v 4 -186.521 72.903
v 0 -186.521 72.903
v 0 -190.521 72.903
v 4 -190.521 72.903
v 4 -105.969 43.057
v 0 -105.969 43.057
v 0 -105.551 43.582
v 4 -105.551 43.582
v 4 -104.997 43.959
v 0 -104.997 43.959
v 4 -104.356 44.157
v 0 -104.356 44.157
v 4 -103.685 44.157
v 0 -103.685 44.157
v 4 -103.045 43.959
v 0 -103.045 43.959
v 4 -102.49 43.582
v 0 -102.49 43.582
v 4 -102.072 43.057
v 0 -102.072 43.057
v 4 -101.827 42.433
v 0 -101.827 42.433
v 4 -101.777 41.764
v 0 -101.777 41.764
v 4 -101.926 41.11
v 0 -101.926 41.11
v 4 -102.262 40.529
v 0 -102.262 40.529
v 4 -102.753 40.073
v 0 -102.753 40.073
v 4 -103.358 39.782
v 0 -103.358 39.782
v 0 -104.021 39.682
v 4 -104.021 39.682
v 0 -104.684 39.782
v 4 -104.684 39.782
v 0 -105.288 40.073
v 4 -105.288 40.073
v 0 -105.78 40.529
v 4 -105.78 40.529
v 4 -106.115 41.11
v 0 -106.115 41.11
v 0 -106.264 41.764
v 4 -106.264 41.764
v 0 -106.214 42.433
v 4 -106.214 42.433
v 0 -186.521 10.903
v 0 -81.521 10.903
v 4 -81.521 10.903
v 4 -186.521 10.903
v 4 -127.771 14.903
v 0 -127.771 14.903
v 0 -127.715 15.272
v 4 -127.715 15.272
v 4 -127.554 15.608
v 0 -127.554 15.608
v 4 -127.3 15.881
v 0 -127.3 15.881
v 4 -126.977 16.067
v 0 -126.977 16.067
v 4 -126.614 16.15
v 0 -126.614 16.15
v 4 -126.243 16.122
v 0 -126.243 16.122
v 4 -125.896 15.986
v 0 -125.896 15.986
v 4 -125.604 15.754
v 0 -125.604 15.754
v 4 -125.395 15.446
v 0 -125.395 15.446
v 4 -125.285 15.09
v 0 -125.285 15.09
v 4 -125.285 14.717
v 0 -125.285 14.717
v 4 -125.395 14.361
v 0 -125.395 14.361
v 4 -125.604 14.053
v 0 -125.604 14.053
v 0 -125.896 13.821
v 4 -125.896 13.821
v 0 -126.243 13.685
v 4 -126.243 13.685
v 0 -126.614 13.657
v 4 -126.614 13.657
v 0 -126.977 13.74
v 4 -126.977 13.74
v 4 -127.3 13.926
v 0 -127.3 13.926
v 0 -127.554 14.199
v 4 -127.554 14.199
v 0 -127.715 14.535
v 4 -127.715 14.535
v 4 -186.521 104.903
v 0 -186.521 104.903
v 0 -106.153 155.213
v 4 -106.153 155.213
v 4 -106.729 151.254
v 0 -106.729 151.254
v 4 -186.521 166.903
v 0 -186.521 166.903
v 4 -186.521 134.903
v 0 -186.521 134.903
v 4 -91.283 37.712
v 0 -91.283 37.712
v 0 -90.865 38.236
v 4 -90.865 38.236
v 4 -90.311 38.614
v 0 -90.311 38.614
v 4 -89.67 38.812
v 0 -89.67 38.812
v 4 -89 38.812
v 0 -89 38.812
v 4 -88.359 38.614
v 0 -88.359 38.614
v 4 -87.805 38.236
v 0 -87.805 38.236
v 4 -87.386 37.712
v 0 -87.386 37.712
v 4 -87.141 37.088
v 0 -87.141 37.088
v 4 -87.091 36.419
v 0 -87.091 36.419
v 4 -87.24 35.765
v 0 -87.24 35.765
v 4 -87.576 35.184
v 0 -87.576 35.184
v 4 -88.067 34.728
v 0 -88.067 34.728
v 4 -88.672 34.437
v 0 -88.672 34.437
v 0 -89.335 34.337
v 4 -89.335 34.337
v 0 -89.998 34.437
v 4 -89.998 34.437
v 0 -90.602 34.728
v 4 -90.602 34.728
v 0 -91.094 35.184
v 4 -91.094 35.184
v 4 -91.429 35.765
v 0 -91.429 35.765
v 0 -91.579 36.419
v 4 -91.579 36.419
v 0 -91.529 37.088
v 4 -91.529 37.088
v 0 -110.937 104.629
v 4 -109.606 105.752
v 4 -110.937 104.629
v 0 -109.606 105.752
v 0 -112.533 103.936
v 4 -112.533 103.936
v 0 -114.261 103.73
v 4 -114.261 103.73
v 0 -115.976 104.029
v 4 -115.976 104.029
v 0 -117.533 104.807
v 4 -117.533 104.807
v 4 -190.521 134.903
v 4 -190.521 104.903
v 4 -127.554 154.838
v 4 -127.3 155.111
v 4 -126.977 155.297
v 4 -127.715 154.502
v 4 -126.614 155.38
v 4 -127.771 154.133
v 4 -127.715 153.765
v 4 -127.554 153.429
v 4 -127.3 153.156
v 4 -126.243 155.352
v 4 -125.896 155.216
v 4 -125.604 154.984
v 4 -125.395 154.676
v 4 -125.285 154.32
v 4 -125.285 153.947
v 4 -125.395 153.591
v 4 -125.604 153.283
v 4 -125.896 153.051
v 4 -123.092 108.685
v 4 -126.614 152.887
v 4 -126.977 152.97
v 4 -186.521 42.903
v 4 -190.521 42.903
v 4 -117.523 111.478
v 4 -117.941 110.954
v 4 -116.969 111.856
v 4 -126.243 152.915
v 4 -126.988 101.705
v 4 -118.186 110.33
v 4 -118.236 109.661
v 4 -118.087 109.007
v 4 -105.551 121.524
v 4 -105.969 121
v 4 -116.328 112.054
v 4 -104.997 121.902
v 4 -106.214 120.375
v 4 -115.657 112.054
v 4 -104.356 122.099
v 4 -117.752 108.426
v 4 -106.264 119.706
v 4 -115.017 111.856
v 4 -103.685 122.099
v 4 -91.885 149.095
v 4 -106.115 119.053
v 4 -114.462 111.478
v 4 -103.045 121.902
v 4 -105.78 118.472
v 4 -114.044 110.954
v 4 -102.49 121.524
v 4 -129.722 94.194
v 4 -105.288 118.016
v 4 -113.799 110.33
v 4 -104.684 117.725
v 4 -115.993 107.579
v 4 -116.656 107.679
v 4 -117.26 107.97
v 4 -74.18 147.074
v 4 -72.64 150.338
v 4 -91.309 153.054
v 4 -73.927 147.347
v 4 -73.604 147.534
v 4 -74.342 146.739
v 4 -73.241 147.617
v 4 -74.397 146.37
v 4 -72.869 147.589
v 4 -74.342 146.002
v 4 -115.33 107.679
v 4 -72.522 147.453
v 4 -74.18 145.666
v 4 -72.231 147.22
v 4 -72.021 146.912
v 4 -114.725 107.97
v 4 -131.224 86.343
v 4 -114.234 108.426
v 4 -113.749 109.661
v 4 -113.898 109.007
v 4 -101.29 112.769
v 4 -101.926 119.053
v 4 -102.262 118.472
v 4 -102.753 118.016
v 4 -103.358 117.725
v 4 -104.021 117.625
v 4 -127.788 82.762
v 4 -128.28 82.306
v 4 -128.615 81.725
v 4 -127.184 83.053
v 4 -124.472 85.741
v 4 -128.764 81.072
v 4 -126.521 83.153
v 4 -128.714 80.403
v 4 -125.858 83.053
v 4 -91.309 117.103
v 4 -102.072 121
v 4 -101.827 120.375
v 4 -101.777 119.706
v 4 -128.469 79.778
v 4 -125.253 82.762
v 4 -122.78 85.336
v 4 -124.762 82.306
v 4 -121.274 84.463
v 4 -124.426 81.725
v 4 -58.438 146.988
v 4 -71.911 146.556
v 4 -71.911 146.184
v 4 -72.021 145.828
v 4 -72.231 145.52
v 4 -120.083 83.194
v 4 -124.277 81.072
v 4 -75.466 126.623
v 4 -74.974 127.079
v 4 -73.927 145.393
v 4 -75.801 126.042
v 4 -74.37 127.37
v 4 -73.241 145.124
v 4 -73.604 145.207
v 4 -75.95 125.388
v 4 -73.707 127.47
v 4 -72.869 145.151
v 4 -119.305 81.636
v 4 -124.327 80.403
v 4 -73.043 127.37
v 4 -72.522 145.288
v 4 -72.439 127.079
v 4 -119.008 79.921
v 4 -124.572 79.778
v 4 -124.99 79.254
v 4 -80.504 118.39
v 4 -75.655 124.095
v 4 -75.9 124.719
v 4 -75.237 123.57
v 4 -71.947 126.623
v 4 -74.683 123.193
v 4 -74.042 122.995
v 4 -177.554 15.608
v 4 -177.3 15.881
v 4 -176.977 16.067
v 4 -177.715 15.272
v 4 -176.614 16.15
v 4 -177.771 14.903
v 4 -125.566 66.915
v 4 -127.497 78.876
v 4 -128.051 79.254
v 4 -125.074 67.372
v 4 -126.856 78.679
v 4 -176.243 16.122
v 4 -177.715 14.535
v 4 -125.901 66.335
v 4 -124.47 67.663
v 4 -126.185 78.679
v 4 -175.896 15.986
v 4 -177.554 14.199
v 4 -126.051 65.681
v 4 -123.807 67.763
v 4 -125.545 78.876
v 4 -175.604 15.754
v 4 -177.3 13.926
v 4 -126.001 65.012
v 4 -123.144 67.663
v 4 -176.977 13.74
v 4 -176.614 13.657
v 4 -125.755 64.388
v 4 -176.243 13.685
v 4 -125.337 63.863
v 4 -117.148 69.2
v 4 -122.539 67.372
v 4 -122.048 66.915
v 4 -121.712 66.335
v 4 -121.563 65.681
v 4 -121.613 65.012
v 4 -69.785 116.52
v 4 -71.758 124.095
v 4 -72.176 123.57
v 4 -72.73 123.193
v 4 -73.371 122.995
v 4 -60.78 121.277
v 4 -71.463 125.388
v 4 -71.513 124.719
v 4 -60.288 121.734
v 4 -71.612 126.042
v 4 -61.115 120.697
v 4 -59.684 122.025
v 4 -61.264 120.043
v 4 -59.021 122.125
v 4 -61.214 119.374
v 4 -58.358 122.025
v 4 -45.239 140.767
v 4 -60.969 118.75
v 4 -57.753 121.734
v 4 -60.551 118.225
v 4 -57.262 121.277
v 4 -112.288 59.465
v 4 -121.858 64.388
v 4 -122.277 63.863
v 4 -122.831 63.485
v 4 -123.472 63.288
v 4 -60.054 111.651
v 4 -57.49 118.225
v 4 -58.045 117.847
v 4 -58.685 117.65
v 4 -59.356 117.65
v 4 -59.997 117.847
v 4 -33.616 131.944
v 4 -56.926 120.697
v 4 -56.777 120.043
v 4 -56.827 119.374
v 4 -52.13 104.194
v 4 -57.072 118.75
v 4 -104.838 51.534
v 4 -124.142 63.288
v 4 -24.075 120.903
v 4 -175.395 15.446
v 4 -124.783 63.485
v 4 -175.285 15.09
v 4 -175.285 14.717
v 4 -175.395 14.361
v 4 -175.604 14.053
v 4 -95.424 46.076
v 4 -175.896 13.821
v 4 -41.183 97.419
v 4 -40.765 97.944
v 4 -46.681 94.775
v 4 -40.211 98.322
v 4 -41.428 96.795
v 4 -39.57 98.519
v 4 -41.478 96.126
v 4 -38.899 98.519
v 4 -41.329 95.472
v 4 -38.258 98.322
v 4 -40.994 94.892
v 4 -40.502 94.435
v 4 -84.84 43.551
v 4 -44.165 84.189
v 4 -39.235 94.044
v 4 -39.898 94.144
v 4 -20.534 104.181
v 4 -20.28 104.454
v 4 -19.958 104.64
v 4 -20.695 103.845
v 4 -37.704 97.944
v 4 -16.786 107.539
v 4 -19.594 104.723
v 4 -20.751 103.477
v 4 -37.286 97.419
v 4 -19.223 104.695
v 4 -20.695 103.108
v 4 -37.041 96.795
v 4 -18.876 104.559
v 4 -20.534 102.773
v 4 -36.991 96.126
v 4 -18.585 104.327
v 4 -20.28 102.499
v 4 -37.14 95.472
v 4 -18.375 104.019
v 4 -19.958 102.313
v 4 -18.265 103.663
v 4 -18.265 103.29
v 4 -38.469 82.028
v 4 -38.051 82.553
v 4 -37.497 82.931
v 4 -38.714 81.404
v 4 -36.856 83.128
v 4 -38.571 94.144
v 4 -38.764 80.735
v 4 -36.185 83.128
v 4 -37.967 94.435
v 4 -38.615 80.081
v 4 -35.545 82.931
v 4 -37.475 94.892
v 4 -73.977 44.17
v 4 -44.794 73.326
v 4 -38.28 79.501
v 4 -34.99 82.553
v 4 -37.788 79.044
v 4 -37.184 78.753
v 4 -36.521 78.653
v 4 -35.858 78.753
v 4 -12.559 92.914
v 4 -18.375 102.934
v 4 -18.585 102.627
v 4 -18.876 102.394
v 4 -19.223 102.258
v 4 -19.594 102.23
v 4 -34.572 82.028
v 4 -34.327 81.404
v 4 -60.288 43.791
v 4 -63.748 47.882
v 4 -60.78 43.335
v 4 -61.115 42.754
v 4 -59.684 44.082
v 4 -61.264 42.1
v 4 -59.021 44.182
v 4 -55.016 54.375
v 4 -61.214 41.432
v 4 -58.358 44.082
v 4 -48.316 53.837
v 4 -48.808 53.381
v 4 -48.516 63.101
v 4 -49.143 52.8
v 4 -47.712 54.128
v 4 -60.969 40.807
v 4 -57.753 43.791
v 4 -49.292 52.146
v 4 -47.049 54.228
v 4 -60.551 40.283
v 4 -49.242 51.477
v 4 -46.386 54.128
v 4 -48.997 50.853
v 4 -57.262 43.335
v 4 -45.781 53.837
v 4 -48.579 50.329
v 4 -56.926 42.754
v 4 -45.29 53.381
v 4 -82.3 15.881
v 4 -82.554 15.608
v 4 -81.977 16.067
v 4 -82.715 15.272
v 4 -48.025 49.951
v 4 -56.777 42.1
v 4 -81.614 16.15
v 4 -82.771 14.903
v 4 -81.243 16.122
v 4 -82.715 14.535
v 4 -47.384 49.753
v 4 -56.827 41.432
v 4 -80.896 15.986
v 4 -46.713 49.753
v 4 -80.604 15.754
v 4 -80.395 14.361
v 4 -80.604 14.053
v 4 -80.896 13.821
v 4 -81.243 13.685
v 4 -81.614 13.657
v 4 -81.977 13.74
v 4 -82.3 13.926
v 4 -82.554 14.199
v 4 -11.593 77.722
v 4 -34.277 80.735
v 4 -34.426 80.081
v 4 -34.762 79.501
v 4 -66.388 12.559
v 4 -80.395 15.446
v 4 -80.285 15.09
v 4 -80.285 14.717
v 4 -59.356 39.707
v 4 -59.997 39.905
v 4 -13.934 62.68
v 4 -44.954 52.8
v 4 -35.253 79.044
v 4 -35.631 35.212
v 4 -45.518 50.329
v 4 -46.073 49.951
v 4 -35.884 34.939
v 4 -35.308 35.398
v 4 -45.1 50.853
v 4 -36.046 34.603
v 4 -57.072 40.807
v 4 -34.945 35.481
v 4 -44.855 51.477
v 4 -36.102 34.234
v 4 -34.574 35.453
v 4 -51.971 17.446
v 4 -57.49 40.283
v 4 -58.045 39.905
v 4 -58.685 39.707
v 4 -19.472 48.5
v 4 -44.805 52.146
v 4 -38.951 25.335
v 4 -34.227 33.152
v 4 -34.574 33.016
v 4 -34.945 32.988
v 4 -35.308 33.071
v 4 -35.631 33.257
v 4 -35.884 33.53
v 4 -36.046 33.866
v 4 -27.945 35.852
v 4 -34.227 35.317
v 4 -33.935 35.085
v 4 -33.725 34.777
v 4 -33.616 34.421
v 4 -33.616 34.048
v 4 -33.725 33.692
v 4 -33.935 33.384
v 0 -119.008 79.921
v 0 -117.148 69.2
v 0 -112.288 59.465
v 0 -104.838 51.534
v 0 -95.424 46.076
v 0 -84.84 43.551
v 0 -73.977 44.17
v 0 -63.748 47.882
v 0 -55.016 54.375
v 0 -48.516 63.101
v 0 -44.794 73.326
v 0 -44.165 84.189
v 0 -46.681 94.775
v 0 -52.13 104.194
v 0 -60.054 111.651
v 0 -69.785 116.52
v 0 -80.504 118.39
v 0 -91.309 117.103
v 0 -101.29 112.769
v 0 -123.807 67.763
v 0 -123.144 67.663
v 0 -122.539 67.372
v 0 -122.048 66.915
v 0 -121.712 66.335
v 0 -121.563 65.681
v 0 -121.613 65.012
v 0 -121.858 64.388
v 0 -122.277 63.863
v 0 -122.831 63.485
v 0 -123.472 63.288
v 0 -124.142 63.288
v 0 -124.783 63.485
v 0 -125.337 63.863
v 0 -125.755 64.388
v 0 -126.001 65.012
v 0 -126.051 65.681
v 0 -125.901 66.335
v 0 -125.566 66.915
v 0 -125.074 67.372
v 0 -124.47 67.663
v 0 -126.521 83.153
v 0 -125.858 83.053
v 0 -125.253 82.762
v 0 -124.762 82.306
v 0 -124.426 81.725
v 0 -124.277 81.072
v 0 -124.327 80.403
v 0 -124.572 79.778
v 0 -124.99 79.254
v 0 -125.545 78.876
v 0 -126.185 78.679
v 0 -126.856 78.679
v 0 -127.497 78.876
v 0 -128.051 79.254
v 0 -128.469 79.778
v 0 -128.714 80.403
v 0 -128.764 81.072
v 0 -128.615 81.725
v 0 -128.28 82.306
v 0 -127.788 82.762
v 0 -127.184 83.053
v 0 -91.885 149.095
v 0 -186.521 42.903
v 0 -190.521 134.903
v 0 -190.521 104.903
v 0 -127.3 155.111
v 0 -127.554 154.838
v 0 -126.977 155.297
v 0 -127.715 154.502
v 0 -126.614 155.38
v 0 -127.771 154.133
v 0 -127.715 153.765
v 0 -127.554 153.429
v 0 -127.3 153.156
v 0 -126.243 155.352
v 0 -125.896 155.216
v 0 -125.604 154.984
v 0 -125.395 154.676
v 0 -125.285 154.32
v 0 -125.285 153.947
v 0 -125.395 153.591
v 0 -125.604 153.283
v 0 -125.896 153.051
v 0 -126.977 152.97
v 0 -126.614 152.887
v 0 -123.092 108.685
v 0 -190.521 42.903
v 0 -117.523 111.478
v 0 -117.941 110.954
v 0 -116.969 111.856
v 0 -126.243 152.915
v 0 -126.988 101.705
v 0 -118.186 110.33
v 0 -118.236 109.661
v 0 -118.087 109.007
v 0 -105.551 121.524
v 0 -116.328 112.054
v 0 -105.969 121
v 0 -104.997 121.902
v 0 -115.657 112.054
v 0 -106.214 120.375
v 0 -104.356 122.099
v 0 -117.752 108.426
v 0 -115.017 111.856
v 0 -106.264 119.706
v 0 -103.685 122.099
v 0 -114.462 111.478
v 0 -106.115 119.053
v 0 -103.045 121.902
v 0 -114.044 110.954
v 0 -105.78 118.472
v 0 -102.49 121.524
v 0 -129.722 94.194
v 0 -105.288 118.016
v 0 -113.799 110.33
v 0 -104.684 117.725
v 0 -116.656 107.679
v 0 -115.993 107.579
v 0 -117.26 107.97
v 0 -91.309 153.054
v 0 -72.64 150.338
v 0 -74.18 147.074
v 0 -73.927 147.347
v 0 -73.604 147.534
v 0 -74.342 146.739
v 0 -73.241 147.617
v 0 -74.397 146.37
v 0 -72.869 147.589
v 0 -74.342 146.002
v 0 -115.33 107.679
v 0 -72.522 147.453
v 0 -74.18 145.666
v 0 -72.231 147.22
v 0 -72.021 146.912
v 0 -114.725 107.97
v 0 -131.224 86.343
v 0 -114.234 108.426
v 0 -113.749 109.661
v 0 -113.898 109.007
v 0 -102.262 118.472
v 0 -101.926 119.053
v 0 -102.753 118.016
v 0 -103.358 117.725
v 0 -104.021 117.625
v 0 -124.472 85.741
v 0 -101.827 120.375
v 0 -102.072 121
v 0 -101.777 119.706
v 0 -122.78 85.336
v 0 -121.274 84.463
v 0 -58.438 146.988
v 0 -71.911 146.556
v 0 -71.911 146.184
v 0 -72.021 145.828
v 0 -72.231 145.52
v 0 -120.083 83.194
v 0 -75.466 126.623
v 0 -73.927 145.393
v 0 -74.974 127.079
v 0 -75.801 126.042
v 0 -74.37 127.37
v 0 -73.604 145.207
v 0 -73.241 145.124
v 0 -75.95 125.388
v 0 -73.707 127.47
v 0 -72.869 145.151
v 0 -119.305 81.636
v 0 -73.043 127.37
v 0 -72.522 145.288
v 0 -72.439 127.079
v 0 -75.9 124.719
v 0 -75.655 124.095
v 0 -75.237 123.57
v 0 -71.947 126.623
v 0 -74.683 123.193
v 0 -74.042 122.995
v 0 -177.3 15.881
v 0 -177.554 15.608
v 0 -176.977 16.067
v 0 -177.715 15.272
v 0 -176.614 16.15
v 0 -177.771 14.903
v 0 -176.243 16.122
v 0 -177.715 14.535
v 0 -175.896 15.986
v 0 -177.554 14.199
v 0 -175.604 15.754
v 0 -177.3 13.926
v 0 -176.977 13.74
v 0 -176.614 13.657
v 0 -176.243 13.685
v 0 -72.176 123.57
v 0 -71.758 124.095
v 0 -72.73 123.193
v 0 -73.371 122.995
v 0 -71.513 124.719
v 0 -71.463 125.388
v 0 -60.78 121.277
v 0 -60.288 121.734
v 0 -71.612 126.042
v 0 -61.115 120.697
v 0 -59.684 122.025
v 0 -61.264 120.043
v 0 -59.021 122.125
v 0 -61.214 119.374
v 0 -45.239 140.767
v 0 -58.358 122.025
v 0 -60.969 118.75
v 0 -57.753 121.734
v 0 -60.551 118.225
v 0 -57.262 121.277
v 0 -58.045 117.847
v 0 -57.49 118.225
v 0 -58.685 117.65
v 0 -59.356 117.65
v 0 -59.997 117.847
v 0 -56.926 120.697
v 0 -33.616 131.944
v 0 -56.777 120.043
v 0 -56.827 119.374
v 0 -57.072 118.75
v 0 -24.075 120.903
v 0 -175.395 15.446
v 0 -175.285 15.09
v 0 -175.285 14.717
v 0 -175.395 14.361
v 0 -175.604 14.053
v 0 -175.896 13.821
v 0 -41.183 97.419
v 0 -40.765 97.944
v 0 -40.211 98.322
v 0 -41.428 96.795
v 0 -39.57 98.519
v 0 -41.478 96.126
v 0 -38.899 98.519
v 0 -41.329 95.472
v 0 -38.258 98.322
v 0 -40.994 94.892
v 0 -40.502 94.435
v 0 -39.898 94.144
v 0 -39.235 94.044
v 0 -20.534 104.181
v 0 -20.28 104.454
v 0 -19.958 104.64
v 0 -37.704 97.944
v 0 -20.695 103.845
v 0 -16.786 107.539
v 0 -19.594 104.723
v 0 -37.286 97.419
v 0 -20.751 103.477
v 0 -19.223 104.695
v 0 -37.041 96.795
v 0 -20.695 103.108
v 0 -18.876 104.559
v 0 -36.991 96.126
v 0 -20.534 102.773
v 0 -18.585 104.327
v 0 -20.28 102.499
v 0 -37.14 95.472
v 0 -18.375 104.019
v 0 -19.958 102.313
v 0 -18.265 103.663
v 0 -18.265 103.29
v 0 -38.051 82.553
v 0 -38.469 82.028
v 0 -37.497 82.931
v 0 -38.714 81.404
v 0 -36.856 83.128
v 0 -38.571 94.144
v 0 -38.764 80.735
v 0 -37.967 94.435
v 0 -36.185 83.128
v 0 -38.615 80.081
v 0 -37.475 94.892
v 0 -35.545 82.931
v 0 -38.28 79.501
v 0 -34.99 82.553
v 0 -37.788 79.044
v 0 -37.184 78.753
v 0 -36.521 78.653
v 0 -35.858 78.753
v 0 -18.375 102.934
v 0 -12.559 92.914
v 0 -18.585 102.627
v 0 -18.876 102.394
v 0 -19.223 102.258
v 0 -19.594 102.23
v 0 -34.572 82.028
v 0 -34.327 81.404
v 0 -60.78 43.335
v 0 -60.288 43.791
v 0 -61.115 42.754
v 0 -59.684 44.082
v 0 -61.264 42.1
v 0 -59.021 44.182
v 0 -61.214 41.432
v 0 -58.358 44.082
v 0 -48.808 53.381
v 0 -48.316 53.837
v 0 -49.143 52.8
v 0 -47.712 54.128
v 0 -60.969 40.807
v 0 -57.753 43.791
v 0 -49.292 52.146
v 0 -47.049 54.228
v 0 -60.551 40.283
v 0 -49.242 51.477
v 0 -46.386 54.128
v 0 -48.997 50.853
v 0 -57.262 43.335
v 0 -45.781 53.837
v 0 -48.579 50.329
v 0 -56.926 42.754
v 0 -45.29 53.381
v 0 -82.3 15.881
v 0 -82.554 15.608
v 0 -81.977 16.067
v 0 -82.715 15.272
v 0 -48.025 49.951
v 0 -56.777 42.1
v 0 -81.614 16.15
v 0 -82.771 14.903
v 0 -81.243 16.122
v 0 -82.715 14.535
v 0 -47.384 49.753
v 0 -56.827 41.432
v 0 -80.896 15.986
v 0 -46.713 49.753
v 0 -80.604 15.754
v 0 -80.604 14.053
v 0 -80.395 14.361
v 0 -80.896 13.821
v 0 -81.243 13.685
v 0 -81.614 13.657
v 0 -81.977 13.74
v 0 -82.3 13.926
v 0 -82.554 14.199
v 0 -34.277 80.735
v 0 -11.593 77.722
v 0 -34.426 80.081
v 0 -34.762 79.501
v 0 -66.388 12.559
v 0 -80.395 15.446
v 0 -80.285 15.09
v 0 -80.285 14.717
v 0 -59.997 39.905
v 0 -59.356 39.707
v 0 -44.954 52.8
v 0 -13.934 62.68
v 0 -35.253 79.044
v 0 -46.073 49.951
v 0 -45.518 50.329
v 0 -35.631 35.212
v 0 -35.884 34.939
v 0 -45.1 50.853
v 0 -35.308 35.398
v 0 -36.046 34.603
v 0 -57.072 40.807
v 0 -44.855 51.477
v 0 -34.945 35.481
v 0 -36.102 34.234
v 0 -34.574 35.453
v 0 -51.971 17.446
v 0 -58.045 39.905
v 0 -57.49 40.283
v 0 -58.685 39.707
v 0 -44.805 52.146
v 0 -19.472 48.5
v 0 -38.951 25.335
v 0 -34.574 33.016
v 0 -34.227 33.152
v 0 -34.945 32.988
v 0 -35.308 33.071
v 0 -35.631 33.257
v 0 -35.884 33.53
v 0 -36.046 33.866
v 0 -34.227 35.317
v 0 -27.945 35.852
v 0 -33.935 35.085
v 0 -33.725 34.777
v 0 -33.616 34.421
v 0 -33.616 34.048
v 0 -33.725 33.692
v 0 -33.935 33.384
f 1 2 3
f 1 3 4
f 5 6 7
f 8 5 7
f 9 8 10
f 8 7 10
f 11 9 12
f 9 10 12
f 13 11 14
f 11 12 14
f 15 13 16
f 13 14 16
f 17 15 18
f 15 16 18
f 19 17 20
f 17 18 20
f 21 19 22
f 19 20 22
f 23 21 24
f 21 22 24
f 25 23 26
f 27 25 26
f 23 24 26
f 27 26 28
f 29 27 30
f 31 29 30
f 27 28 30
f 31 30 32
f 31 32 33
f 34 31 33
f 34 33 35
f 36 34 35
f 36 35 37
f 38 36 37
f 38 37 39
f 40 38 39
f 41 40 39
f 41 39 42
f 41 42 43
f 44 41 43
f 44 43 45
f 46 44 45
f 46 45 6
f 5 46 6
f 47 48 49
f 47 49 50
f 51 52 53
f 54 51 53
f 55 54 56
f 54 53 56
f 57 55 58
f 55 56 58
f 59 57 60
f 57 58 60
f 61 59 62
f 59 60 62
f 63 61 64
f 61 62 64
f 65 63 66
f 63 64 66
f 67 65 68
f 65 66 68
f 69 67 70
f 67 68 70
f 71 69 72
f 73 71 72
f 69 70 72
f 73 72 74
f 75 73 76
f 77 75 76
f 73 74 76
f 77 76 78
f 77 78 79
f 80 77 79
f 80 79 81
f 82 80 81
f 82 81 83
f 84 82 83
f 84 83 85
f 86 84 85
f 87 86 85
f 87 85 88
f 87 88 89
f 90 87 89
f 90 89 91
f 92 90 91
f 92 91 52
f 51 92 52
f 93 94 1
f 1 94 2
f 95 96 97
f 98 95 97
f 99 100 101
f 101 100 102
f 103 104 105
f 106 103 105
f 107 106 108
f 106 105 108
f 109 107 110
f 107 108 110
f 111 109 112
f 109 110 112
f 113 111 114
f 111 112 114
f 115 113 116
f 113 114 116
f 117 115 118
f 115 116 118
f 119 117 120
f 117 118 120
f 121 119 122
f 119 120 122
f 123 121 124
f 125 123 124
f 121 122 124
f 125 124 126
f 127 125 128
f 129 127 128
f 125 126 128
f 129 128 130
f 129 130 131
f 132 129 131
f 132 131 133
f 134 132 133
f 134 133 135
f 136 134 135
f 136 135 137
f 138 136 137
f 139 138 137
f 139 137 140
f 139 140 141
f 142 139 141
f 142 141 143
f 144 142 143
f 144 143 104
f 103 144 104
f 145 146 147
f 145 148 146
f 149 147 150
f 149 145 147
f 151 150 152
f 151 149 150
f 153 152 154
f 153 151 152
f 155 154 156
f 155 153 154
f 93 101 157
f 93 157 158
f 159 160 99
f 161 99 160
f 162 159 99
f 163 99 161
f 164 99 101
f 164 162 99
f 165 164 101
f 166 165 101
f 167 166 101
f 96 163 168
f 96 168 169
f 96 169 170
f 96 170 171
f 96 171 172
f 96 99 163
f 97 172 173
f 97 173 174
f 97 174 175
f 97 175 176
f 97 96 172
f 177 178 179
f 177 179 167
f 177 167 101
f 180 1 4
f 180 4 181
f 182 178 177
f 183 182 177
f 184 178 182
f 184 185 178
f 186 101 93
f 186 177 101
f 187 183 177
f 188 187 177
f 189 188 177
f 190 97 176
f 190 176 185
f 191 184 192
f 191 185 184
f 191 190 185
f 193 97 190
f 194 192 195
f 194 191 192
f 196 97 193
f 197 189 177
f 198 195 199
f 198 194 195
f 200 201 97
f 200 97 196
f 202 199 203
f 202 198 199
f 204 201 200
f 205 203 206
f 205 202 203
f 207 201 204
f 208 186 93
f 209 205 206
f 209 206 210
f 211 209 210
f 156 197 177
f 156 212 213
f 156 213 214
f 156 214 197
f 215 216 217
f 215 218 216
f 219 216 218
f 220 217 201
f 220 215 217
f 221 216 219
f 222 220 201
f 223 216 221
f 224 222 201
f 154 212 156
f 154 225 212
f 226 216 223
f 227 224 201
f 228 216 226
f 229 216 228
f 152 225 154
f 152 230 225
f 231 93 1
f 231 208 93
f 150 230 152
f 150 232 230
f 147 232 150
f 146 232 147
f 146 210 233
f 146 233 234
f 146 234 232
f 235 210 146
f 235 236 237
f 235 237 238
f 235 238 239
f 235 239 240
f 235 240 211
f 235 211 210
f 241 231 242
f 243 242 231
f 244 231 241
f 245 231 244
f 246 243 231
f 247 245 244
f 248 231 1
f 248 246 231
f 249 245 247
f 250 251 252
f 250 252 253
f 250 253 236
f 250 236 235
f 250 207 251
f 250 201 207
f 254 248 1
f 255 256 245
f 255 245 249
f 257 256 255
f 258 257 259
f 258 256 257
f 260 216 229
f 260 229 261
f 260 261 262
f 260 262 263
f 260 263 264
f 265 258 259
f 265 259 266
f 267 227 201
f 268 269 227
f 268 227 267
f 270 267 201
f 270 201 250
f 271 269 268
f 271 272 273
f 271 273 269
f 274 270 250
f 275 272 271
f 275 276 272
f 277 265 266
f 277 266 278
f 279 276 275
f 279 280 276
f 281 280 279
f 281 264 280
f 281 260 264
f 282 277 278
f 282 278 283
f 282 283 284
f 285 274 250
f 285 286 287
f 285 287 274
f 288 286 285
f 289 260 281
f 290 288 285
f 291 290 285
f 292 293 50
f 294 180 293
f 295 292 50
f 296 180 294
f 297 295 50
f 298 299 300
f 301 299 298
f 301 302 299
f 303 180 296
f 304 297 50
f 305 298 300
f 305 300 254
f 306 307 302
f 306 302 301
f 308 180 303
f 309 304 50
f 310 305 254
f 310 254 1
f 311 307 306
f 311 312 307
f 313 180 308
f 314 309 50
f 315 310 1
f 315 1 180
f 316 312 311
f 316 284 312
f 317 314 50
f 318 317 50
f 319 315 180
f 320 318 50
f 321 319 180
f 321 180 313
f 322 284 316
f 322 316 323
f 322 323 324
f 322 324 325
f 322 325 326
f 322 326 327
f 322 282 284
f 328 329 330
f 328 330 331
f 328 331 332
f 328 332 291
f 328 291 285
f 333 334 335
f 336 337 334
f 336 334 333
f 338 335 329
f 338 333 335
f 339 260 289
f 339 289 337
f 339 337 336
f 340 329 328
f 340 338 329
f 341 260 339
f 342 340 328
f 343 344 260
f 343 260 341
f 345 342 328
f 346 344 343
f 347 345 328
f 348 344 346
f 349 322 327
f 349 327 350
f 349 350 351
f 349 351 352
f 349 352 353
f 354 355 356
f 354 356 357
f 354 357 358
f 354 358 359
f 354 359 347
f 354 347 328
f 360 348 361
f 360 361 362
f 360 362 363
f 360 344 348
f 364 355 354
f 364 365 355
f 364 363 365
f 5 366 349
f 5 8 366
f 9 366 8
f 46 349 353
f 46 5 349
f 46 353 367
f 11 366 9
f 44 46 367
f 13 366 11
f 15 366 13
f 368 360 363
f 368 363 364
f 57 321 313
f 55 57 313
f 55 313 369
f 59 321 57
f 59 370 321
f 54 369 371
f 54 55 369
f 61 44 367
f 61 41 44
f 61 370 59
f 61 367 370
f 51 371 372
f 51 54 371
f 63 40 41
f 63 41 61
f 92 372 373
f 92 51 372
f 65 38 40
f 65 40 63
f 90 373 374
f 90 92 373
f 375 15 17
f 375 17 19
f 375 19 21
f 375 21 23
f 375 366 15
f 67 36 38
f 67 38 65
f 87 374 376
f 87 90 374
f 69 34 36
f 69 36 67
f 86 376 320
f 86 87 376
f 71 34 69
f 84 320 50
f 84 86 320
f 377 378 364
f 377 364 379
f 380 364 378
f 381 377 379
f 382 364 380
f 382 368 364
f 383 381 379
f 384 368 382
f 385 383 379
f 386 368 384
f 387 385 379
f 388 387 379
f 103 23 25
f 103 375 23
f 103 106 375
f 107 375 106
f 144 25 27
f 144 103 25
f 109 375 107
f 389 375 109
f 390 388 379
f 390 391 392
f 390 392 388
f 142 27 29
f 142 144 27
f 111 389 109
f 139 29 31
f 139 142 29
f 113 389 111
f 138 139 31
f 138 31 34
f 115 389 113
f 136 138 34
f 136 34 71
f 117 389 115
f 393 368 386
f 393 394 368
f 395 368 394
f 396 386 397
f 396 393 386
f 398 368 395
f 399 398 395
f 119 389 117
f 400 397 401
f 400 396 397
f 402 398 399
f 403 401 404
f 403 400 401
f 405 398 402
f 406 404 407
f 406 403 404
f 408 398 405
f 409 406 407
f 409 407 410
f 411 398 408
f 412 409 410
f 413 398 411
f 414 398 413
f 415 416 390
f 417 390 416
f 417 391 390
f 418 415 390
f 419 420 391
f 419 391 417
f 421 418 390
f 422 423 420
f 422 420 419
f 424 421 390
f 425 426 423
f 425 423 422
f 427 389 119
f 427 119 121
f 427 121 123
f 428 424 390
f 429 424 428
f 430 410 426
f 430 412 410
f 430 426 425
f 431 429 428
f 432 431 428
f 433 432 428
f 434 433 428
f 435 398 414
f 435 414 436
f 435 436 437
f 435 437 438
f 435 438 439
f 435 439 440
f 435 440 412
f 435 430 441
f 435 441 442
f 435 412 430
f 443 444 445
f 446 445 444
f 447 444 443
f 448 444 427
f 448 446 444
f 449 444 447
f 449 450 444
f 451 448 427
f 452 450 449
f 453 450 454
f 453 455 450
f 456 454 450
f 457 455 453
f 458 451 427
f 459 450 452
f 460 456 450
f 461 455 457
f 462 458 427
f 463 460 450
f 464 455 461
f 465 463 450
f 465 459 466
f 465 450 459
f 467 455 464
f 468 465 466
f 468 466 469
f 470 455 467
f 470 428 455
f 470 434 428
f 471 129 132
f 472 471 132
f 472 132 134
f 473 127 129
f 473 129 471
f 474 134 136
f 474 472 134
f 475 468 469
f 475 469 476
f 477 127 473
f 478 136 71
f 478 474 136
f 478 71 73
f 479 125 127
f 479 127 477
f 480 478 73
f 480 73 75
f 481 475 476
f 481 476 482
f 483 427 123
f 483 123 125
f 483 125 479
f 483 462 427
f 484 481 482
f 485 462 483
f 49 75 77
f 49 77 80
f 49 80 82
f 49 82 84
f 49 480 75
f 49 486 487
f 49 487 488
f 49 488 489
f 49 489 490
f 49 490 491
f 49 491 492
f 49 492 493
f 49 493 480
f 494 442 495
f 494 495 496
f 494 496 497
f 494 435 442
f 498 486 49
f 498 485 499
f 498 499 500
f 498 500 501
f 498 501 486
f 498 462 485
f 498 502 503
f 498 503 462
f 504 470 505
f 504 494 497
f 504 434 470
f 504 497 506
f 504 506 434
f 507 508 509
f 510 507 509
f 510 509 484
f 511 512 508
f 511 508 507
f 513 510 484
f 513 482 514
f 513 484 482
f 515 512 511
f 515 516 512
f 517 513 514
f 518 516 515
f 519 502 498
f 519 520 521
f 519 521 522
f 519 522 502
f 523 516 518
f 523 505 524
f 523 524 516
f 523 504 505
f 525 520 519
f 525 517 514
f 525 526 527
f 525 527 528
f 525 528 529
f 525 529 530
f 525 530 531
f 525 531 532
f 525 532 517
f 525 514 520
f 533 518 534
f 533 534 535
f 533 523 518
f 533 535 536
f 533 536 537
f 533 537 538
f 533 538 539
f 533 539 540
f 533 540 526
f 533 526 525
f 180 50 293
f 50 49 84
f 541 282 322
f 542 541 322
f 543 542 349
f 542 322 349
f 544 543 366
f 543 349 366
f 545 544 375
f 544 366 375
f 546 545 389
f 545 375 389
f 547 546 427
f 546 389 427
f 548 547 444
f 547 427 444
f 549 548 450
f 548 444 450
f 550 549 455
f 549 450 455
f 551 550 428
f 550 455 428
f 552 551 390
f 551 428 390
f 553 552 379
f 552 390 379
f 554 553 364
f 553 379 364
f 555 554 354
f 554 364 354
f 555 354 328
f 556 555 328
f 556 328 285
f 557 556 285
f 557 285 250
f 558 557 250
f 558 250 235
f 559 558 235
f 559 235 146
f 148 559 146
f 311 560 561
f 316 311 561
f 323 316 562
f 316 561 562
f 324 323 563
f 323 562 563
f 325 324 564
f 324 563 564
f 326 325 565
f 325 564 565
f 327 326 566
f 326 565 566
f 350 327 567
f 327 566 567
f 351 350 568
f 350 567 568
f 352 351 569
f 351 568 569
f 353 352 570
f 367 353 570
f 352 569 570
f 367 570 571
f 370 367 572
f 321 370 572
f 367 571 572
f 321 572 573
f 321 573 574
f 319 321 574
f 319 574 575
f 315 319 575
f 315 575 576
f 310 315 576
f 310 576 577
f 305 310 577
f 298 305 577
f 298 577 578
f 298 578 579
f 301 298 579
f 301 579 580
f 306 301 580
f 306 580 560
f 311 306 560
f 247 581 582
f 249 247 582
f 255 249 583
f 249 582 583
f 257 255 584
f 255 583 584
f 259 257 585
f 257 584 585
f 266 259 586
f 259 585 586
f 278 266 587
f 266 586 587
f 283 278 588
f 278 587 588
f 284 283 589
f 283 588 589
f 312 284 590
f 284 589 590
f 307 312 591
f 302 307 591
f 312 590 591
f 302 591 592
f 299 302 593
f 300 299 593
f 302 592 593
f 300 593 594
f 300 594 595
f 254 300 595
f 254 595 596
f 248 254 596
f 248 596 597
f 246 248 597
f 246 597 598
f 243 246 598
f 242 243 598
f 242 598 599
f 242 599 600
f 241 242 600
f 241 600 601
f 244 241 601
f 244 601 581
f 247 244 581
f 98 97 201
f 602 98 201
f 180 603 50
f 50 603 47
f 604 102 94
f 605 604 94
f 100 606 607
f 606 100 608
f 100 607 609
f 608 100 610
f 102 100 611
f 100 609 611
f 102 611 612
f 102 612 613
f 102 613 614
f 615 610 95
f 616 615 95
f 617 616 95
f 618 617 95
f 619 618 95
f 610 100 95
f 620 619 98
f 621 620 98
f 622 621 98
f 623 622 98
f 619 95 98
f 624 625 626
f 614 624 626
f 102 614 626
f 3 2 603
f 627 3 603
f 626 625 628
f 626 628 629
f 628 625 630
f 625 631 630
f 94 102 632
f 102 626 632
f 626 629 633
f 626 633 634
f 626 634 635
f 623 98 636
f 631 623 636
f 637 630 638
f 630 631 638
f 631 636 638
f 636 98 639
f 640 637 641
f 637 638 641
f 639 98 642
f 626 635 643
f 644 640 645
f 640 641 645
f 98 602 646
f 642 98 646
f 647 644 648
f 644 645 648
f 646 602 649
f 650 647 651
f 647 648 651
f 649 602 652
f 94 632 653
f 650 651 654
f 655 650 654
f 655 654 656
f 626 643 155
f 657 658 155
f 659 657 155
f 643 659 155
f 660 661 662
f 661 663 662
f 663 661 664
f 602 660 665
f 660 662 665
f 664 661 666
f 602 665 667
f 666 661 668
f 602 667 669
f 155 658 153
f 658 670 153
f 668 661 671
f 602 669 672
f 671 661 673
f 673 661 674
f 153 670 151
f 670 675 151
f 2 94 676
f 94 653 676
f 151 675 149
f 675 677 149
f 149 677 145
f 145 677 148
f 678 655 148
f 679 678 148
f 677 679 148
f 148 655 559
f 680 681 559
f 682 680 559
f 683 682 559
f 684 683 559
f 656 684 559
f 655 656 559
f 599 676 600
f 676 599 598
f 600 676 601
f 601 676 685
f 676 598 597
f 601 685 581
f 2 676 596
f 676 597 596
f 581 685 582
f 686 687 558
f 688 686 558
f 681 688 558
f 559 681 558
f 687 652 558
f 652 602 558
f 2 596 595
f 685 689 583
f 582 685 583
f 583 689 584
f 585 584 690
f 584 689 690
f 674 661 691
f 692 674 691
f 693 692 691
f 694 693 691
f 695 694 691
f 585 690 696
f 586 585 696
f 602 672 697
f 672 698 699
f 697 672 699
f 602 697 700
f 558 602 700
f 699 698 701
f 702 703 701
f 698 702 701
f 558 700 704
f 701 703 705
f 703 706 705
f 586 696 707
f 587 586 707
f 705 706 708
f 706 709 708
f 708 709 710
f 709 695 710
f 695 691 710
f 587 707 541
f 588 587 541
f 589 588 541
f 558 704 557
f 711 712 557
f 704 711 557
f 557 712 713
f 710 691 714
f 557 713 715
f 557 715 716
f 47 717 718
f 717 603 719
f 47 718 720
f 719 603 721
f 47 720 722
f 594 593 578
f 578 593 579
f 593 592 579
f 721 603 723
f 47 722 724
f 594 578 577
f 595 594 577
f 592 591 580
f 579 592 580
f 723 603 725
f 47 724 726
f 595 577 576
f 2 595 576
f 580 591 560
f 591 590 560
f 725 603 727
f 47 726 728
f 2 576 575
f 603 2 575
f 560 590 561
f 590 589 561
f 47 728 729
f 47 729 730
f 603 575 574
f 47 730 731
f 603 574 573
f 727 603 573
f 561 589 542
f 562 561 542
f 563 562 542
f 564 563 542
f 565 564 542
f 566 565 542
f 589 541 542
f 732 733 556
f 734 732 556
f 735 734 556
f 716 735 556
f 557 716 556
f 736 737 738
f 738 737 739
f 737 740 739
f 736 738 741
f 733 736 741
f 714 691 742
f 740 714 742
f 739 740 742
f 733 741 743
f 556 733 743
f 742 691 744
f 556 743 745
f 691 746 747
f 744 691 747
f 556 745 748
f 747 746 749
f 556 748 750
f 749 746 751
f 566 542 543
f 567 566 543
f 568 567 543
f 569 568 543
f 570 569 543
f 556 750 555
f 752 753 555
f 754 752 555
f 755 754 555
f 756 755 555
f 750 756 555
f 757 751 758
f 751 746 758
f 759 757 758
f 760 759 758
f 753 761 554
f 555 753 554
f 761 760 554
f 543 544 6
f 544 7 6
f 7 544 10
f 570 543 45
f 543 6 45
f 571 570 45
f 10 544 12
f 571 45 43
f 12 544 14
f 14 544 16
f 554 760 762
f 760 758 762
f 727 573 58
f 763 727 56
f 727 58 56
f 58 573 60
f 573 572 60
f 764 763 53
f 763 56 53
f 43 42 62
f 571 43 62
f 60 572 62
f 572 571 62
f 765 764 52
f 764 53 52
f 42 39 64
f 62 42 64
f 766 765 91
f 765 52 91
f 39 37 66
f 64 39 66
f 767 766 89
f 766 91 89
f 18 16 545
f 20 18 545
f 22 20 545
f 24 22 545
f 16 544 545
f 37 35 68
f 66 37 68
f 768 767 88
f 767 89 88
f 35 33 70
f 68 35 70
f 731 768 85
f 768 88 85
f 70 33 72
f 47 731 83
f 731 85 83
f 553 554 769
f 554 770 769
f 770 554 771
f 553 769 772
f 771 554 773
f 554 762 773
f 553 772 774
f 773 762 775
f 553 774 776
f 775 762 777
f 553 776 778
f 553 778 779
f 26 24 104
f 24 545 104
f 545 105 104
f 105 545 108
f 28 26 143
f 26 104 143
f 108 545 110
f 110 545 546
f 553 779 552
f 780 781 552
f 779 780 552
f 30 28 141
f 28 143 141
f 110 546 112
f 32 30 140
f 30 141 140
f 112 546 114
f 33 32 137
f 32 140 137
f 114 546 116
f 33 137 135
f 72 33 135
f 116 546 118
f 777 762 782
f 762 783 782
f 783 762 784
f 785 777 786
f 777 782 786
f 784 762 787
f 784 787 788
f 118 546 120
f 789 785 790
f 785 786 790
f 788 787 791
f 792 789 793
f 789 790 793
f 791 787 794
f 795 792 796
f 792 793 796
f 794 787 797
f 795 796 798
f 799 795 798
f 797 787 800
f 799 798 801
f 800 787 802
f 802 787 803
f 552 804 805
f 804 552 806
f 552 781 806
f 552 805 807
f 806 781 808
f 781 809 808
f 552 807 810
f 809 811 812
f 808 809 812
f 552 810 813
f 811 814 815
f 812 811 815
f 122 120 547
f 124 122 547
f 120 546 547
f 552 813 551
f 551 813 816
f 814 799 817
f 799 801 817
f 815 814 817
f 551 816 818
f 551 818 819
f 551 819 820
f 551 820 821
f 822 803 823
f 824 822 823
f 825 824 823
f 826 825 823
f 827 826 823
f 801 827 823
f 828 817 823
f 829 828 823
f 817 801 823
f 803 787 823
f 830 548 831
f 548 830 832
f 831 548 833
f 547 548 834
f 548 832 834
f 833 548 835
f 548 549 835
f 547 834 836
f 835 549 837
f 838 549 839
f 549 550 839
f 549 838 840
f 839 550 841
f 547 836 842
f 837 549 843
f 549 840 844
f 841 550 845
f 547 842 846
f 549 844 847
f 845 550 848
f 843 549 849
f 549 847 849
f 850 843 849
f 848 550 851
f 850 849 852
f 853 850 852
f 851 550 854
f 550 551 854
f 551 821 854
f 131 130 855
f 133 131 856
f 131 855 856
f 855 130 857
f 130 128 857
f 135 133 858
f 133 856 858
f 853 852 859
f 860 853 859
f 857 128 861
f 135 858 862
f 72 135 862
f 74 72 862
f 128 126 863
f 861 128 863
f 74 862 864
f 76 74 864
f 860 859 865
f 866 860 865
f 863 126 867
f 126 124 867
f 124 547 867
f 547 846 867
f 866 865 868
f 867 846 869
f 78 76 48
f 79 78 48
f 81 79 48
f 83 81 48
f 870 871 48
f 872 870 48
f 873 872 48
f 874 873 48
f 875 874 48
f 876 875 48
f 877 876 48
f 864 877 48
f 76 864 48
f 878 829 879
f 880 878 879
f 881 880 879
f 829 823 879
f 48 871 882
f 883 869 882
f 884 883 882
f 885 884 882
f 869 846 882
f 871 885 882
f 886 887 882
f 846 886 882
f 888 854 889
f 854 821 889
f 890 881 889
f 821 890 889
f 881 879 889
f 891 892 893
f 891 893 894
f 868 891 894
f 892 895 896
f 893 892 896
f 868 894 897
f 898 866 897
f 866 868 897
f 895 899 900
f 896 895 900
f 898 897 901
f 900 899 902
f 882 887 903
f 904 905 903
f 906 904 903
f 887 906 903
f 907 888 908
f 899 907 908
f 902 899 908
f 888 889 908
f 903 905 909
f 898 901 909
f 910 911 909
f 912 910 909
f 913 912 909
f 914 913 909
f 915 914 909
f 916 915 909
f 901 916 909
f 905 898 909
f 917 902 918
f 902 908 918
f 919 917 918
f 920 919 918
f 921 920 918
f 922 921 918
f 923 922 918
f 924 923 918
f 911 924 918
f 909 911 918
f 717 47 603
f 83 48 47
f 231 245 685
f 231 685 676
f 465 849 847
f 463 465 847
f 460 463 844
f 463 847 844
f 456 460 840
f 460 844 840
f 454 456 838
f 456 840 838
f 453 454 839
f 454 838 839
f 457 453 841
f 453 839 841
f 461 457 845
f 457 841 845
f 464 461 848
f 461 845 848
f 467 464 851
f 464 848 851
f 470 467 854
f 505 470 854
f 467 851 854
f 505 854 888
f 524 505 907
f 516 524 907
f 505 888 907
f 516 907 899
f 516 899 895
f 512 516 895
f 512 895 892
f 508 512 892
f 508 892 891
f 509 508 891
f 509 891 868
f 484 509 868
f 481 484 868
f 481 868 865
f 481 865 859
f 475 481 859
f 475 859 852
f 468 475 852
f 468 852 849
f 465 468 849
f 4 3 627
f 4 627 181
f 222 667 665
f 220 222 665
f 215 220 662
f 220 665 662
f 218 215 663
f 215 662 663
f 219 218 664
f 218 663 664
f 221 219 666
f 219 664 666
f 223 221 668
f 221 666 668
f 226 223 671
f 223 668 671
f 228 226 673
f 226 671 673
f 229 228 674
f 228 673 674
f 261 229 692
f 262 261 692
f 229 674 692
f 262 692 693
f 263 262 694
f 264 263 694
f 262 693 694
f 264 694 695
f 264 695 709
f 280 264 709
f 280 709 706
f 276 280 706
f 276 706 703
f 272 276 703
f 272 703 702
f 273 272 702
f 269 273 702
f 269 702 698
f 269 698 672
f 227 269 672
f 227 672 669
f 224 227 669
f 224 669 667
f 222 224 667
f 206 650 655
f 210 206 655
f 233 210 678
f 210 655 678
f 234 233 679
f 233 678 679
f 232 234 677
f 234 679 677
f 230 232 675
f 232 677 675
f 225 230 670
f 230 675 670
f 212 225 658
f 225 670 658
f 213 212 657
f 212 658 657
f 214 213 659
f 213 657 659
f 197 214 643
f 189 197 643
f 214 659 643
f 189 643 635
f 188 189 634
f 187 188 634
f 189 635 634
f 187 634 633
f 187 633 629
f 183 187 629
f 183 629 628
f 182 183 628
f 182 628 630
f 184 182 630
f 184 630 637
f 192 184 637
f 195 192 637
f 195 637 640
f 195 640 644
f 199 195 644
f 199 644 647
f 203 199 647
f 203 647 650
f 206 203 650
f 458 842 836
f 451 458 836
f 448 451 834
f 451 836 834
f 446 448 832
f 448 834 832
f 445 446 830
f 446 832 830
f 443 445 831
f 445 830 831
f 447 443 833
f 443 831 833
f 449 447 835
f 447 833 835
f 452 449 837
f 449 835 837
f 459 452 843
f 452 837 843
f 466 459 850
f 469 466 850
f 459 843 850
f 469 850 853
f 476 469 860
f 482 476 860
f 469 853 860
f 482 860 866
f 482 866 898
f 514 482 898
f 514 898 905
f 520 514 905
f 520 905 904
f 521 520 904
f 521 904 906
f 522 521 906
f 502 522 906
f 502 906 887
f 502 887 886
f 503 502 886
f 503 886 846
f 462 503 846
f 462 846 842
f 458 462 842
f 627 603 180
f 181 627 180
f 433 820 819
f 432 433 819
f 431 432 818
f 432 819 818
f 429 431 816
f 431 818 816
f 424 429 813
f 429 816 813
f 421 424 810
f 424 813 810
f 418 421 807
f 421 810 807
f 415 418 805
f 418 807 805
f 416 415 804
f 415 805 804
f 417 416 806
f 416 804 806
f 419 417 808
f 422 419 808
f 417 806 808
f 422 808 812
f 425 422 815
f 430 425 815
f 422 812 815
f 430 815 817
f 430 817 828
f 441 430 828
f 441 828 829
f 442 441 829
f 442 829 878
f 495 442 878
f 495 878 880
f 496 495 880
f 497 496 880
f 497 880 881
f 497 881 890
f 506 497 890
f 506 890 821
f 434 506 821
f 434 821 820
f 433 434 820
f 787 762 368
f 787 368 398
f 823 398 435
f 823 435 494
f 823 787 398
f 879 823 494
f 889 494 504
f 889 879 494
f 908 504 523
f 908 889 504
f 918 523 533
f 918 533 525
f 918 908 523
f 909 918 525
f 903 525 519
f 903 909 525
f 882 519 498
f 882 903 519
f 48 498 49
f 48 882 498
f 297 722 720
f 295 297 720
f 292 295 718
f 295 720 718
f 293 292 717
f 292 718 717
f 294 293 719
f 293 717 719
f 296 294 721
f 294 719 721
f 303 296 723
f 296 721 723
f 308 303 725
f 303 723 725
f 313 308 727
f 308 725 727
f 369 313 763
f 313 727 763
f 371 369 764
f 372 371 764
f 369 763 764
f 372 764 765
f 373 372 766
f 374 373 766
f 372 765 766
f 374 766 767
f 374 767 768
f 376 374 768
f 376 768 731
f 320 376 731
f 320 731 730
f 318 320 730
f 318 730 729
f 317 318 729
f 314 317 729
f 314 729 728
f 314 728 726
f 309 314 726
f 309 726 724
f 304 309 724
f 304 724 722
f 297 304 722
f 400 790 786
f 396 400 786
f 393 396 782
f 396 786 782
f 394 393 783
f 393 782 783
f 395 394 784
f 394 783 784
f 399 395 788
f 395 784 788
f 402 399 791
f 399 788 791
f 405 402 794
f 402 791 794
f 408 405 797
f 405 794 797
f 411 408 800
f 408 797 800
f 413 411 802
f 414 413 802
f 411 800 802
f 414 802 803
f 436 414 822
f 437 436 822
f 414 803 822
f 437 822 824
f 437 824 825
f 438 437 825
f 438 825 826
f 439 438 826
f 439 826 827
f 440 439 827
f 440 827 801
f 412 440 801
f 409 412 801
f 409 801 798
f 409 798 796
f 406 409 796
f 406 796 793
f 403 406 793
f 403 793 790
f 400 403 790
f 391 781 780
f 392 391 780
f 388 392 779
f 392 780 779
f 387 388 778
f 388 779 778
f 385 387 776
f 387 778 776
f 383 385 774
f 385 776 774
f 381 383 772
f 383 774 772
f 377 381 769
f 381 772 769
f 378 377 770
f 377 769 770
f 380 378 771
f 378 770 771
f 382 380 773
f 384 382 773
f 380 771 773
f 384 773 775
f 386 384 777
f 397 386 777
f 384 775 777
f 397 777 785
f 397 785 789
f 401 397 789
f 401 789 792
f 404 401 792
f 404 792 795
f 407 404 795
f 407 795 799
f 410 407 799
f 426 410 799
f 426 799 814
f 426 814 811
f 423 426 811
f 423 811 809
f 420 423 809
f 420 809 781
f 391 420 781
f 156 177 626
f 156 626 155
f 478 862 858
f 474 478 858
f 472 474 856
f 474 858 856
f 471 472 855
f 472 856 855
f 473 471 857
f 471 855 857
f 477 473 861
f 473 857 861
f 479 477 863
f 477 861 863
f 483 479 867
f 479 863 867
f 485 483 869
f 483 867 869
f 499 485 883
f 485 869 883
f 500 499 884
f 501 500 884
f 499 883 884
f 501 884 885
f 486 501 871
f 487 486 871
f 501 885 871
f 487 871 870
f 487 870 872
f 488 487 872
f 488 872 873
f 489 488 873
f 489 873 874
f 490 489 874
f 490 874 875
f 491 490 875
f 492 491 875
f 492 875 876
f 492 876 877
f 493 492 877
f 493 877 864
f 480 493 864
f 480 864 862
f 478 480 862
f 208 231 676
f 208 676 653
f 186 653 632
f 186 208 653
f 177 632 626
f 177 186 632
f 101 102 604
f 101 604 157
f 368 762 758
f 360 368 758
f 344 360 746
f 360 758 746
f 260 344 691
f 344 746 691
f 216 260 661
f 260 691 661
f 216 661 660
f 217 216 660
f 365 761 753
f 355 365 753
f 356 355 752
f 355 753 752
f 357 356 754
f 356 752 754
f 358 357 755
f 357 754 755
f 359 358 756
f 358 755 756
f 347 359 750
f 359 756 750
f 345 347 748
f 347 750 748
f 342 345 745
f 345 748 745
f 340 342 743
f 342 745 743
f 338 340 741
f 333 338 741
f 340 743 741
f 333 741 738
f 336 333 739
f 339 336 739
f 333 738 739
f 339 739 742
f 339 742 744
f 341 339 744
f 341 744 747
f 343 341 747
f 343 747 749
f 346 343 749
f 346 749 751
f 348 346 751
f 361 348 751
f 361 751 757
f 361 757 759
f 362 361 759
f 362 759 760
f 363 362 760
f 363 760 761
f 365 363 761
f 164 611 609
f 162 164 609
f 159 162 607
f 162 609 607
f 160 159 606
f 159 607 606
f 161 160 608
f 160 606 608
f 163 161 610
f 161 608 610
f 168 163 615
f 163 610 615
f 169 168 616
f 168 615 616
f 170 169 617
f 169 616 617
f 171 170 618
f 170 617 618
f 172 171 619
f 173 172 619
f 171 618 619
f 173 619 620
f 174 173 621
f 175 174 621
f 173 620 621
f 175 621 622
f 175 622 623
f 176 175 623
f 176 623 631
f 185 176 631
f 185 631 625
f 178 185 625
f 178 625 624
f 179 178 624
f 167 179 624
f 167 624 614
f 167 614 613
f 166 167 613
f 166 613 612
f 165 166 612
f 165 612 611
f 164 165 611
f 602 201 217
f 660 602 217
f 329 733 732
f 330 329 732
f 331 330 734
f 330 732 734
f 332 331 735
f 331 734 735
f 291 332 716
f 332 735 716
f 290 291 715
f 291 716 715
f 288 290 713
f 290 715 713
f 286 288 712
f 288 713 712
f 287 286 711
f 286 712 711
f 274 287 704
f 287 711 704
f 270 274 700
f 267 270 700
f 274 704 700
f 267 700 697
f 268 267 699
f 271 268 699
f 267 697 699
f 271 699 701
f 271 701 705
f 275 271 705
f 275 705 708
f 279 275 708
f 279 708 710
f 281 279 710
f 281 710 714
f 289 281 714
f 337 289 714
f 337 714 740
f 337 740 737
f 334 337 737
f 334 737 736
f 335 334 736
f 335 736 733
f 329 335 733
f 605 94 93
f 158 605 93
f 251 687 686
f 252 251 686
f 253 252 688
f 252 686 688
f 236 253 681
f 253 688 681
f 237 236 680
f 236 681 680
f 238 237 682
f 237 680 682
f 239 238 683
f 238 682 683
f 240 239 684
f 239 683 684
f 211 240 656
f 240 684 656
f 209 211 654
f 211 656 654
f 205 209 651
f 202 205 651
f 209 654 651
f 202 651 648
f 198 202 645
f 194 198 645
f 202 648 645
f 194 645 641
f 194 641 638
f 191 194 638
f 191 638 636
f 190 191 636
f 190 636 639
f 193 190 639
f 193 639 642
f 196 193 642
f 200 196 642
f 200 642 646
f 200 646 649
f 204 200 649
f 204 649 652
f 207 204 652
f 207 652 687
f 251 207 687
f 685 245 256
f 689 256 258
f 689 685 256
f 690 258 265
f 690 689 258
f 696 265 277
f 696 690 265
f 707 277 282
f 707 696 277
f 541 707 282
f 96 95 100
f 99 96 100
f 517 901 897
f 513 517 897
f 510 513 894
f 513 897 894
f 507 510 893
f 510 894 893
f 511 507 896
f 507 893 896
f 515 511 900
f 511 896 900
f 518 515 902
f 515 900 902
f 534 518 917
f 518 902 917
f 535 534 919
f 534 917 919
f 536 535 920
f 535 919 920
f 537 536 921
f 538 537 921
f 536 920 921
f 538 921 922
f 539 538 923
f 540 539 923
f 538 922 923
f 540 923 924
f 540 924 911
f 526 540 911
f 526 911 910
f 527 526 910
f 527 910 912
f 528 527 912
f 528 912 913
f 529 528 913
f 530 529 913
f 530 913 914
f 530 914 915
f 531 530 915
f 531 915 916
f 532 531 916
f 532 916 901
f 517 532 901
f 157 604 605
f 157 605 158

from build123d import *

# Parameters (mm, degrees)
AUFSATZ_LINEAR_AUSTRAGEN1_DEPTH      = 4
SKIZZE1_9_R                          = 10
SCHNITT_LINEAR_AUSTRAGEN1_DEPTH      = 6
F_4_1_4_1_DURCHMESSER_BOHRUNG1_D     = 4.1
F_4_1_4_1_DURCHMESSER_BOHRUNG1_DEPTH = 20
F_4_1_4_1_DURCHMESSER_BOHRUNG1_TIP   = 1.231764269
FASE1_SIZE                           = 1
SCHNITT_LINEAR_AUSTRAGEN2_DEPTH      = 251.325290812
SCHNITT_LINEAR_AUSTRAGEN2_DEPTH_BACK = 10
F_4_8_4_8_DURCHMESSER_BOHRUNG1_D     = 4.8
F_4_8_4_8_DURCHMESSER_BOHRUNG1_DEPTH = 4
F_4_8_4_8_DURCHMESSER_BOHRUNG1_TIP   = 1.442065486
SKIZZE21_R                           = 37.5
SCHNITT_LINEAR_AUSTRAGEN3_DEPTH      = 251.325290812
DURCHGANGSLOCH_F_R_M41_D             = 4.5
KREISMUSTER1_COUNT                   = 6
M3_GEWINDEBOHRUNG1_D                 = 2.5
M3_GEWINDEBOHRUNG1_DEPTH             = 8.5
M3_GEWINDEBOHRUNG1_TIP               = 0.751075774
SCHNITT_LINEAR_AUSTRAGEN4_DEPTH      = 251.325290812
SCHNITT_LINEAR_AUSTRAGEN5_DEPTH      = 251.325290812
VERRUNDUNG1_R                        = 6
SKIZZE31_W                           = 4
SKIZZE31_H                           = 30
AUFSATZ_LINEAR_AUSTRAGEN2_DEPTH      = 4


with BuildPart() as part:
    # Skizze1 → Aufsatz-Linear austragen1 (new body)
    with BuildSketch(Plane(origin=(0, 0, 0), x_dir=(0, 0, -1), z_dir=(1, 0, 0))):
        with BuildLine():
            Line((-120.903454086, -13.395859459), (-120.903454086, -24.075118314))
            ThreePointArc((-120.903454086, -24.075118314), (-140.766673303, -45.238586838), (-150.337818424, -72.639919993))
            Line((-150.337818424, -72.639919993), (-166.903454086, -186.520744783))
            Line((-166.903454086, -186.520744783), (-10.903454086, -186.520744783))
            Line((-10.903454086, -186.520744783), (-1.903454086, -186.520744783))
            Line((-1.903454086, -186.520744783), (-1.903454086, -81.52074478))
            ThreePointArc((-1.903454086, -81.52074478), (-41.654250272, -12.960552248), (-120.903454086, -13.395859459))
        make_face()
    extrude(amount=AUFSATZ_LINEAR_AUSTRAGEN1_DEPTH)

    # Skizze1<9> → Schnitt-Linear austragen1 (cut)
    with BuildSketch(Plane(origin=(0, 0, 0), x_dir=(0, 0, -1), z_dir=(1, 0, 0))):
        with Locations((-80.903454086, -81.52074478)):
            Circle(SKIZZE1_9_R)
    extrude(amount=SCHNITT_LINEAR_AUSTRAGEN1_DEPTH, mode=Mode.SUBTRACT)

    # Ø4.1 (4.1) Durchmesser Bohrung1
    with Locations(Plane.ZY):
        with Locations((80.903454086, -66.02074478), (96.403454086, -81.52074478), (80.903454086, -97.02074478), (65.403454086, -81.52074478)):
            Hole(F_4_1_4_1_DURCHMESSER_BOHRUNG1_D / 2, depth=F_4_1_4_1_DURCHMESSER_BOHRUNG1_DEPTH)
            with Locations((0, 0, -(F_4_1_4_1_DURCHMESSER_BOHRUNG1_DEPTH + F_4_1_4_1_DURCHMESSER_BOHRUNG1_TIP / 2))):  # 118° drill point
                Cone(0, F_4_1_4_1_DURCHMESSER_BOHRUNG1_D / 2, F_4_1_4_1_DURCHMESSER_BOHRUNG1_TIP, mode=Mode.SUBTRACT)

    # Fase1
    fase1_edges = [part.edges().sort_by_distance(p)[0] for p in [
        (0, -97.02074478, 82.953454086),
        (4, -97.02074478, 82.953454086),
        (0, -81.52074478, 67.453454086),
        (4, -81.52074478, 67.453454086),
        (0, -66.02074478, 82.953454086),
        (4, -66.02074478, 82.953454086),
        (0, -81.52074478, 98.453454086),
        (4, -81.52074478, 98.453454086),
    ]]
    chamfer(fase1_edges, length=FASE1_SIZE)

    # Skizze1<18> → Schnitt-Linear austragen2 (cut, two sides: drawn at the far end of the back side and taken through both)
    with BuildSketch(Plane(origin=(0, 0, 0), x_dir=(0, 0, -1), z_dir=(1, 0, 0)).offset(-SCHNITT_LINEAR_AUSTRAGEN2_DEPTH_BACK)):
        with BuildLine():
            ThreePointArc((-1.903454086, -81.52074478), (-41.654250272, -12.960552248), (-120.903454086, -13.395859459))
            Line((-120.903454086, -13.395859459), (-120.903454086, -24.075118314))
            ThreePointArc((-120.903454086, -24.075118314), (-48.499750594, -19.47237655), (-10.903454086, -81.52074478))
            Line((-10.903454086, -81.52074478), (-10.903454086, -186.520744783))
            Line((-10.903454086, -186.520744783), (-1.903454086, -186.520744783))
            Line((-1.903454086, -186.520744783), (-1.903454086, -81.52074478))
        make_face()
    extrude(amount=SCHNITT_LINEAR_AUSTRAGEN2_DEPTH + SCHNITT_LINEAR_AUSTRAGEN2_DEPTH_BACK, mode=Mode.SUBTRACT)

    # Ø4.8 (4.8) Durchmesser Bohrung1
    with Locations(Plane(origin=(4, 0, 0), x_dir=(0, 0, -1), z_dir=(1, 0, 0))):
        with Locations((-80.903454086, -46.52074478), (-80.903454086, -116.52074478)):
            Hole(F_4_8_4_8_DURCHMESSER_BOHRUNG1_D / 2, depth=F_4_8_4_8_DURCHMESSER_BOHRUNG1_DEPTH)
            with Locations((0, 0, -(F_4_8_4_8_DURCHMESSER_BOHRUNG1_DEPTH + F_4_8_4_8_DURCHMESSER_BOHRUNG1_TIP / 2))):  # 118° drill point
                Cone(0, F_4_8_4_8_DURCHMESSER_BOHRUNG1_D / 2, F_4_8_4_8_DURCHMESSER_BOHRUNG1_TIP, mode=Mode.SUBTRACT)

    # Skizze21 → Schnitt-Linear austragen3 (cut, through all)
    with BuildSketch(Plane.YZ.offset(4)):
        with Locations((-81.52074478, 80.903454086)):
            Circle(SKIZZE21_R)
    extrude(amount=-SCHNITT_LINEAR_AUSTRAGEN3_DEPTH, mode=Mode.SUBTRACT)

    # Durchgangsloch für M41 (through all)
    with Locations(Plane(origin=(4, 0, 0), x_dir=(0, 0, -1), z_dir=(1, 0, 0))):
        with Locations((-80.903454086, -126.52074478), (-65.512547636, -123.806912715)):
            durchgangsloch_f_r_m41 = Hole(DURCHGANGSLOCH_F_R_M41_D / 2)

    # Kreismuster1: Durchgangsloch für M41 ×6 about axis
    kreismuster1_axis = Axis((4, -81.52074478, 80.903454086), (1, 0, 0))
    for i in range(1, KREISMUSTER1_COUNT):
        add(durchgangsloch_f_r_m41.rotate(kreismuster1_axis, i * 360 / KREISMUSTER1_COUNT), mode=Mode.SUBTRACT)

    # M3 Gewindebohrung1
    with Locations(Plane.YZ.offset(4)):
        with Locations((-176.520744783, 14.903454086), (-126.520744783, 14.903454086), (-34.851697221, 34.234406527), (-19.501031808, 103.476783545), (-81.52074478, 14.903454086), (-73.147395695, 146.370140462), (-126.520744783, 154.133475978)):
            Hole(M3_GEWINDEBOHRUNG1_D / 2, depth=M3_GEWINDEBOHRUNG1_DEPTH)
            with Locations((0, 0, -(M3_GEWINDEBOHRUNG1_DEPTH + M3_GEWINDEBOHRUNG1_TIP / 2))):  # 118° drill point
                Cone(0, M3_GEWINDEBOHRUNG1_D / 2, M3_GEWINDEBOHRUNG1_TIP, mode=Mode.SUBTRACT)

    # Skizze29 → Schnitt-Linear austragen4 (cut, through all)
    with BuildSketch(Plane.YZ.offset(4)):
        Polygon((-106.153245921, 155.212823046), (-106.729044518, 151.254482993), (-91.885269319, 149.095238254), (-91.309470722, 153.053578307), align=None)
    extrude(amount=-SCHNITT_LINEAR_AUSTRAGEN4_DEPTH, mode=Mode.SUBTRACT)

    # Skizze30 → Schnitt-Linear austragen5 (cut, through all)
    with BuildSketch(Plane.YZ.offset(4)):
        with BuildLine():
            Line((-118.770131027, 85.231643571), (-131.223971881, 86.3430511))
            ThreePointArc((-131.223971881, 86.3430511), (-128.505375819, 98.004461252), (-123.092131269, 108.685099562))
            Line((-123.092131269, 108.685099562), (-112.837536697, 101.53131253))
            ThreePointArc((-112.837536697, 101.53131253), (-116.759218059, 93.72920946), (-118.770131027, 85.231643571))
        make_face()
    extrude(amount=-SCHNITT_LINEAR_AUSTRAGEN5_DEPTH, mode=Mode.SUBTRACT)

    # Verrundung1
    verrundung1_edges = [part.edges().sort_by_distance(p)[0] for p in [
        (2, -118.770131027, 85.231643571),
        (2, -112.837536697, 101.53131253),
    ]]
    fillet(verrundung1_edges, radius=VERRUNDUNG1_R)

    # Skizze31 → Aufsatz-Linear austragen2 (add)
    with BuildSketch(Plane.XZ.offset(186.520744783)):
        with Locations((2, 57.903454086)):
            Rectangle(SKIZZE31_W, SKIZZE31_H)
        with Locations((2, 119.903454086)):
            Rectangle(SKIZZE31_W, SKIZZE31_H)
    extrude(amount=AUFSATZ_LINEAR_AUSTRAGEN2_DEPTH)


solid = part.part
